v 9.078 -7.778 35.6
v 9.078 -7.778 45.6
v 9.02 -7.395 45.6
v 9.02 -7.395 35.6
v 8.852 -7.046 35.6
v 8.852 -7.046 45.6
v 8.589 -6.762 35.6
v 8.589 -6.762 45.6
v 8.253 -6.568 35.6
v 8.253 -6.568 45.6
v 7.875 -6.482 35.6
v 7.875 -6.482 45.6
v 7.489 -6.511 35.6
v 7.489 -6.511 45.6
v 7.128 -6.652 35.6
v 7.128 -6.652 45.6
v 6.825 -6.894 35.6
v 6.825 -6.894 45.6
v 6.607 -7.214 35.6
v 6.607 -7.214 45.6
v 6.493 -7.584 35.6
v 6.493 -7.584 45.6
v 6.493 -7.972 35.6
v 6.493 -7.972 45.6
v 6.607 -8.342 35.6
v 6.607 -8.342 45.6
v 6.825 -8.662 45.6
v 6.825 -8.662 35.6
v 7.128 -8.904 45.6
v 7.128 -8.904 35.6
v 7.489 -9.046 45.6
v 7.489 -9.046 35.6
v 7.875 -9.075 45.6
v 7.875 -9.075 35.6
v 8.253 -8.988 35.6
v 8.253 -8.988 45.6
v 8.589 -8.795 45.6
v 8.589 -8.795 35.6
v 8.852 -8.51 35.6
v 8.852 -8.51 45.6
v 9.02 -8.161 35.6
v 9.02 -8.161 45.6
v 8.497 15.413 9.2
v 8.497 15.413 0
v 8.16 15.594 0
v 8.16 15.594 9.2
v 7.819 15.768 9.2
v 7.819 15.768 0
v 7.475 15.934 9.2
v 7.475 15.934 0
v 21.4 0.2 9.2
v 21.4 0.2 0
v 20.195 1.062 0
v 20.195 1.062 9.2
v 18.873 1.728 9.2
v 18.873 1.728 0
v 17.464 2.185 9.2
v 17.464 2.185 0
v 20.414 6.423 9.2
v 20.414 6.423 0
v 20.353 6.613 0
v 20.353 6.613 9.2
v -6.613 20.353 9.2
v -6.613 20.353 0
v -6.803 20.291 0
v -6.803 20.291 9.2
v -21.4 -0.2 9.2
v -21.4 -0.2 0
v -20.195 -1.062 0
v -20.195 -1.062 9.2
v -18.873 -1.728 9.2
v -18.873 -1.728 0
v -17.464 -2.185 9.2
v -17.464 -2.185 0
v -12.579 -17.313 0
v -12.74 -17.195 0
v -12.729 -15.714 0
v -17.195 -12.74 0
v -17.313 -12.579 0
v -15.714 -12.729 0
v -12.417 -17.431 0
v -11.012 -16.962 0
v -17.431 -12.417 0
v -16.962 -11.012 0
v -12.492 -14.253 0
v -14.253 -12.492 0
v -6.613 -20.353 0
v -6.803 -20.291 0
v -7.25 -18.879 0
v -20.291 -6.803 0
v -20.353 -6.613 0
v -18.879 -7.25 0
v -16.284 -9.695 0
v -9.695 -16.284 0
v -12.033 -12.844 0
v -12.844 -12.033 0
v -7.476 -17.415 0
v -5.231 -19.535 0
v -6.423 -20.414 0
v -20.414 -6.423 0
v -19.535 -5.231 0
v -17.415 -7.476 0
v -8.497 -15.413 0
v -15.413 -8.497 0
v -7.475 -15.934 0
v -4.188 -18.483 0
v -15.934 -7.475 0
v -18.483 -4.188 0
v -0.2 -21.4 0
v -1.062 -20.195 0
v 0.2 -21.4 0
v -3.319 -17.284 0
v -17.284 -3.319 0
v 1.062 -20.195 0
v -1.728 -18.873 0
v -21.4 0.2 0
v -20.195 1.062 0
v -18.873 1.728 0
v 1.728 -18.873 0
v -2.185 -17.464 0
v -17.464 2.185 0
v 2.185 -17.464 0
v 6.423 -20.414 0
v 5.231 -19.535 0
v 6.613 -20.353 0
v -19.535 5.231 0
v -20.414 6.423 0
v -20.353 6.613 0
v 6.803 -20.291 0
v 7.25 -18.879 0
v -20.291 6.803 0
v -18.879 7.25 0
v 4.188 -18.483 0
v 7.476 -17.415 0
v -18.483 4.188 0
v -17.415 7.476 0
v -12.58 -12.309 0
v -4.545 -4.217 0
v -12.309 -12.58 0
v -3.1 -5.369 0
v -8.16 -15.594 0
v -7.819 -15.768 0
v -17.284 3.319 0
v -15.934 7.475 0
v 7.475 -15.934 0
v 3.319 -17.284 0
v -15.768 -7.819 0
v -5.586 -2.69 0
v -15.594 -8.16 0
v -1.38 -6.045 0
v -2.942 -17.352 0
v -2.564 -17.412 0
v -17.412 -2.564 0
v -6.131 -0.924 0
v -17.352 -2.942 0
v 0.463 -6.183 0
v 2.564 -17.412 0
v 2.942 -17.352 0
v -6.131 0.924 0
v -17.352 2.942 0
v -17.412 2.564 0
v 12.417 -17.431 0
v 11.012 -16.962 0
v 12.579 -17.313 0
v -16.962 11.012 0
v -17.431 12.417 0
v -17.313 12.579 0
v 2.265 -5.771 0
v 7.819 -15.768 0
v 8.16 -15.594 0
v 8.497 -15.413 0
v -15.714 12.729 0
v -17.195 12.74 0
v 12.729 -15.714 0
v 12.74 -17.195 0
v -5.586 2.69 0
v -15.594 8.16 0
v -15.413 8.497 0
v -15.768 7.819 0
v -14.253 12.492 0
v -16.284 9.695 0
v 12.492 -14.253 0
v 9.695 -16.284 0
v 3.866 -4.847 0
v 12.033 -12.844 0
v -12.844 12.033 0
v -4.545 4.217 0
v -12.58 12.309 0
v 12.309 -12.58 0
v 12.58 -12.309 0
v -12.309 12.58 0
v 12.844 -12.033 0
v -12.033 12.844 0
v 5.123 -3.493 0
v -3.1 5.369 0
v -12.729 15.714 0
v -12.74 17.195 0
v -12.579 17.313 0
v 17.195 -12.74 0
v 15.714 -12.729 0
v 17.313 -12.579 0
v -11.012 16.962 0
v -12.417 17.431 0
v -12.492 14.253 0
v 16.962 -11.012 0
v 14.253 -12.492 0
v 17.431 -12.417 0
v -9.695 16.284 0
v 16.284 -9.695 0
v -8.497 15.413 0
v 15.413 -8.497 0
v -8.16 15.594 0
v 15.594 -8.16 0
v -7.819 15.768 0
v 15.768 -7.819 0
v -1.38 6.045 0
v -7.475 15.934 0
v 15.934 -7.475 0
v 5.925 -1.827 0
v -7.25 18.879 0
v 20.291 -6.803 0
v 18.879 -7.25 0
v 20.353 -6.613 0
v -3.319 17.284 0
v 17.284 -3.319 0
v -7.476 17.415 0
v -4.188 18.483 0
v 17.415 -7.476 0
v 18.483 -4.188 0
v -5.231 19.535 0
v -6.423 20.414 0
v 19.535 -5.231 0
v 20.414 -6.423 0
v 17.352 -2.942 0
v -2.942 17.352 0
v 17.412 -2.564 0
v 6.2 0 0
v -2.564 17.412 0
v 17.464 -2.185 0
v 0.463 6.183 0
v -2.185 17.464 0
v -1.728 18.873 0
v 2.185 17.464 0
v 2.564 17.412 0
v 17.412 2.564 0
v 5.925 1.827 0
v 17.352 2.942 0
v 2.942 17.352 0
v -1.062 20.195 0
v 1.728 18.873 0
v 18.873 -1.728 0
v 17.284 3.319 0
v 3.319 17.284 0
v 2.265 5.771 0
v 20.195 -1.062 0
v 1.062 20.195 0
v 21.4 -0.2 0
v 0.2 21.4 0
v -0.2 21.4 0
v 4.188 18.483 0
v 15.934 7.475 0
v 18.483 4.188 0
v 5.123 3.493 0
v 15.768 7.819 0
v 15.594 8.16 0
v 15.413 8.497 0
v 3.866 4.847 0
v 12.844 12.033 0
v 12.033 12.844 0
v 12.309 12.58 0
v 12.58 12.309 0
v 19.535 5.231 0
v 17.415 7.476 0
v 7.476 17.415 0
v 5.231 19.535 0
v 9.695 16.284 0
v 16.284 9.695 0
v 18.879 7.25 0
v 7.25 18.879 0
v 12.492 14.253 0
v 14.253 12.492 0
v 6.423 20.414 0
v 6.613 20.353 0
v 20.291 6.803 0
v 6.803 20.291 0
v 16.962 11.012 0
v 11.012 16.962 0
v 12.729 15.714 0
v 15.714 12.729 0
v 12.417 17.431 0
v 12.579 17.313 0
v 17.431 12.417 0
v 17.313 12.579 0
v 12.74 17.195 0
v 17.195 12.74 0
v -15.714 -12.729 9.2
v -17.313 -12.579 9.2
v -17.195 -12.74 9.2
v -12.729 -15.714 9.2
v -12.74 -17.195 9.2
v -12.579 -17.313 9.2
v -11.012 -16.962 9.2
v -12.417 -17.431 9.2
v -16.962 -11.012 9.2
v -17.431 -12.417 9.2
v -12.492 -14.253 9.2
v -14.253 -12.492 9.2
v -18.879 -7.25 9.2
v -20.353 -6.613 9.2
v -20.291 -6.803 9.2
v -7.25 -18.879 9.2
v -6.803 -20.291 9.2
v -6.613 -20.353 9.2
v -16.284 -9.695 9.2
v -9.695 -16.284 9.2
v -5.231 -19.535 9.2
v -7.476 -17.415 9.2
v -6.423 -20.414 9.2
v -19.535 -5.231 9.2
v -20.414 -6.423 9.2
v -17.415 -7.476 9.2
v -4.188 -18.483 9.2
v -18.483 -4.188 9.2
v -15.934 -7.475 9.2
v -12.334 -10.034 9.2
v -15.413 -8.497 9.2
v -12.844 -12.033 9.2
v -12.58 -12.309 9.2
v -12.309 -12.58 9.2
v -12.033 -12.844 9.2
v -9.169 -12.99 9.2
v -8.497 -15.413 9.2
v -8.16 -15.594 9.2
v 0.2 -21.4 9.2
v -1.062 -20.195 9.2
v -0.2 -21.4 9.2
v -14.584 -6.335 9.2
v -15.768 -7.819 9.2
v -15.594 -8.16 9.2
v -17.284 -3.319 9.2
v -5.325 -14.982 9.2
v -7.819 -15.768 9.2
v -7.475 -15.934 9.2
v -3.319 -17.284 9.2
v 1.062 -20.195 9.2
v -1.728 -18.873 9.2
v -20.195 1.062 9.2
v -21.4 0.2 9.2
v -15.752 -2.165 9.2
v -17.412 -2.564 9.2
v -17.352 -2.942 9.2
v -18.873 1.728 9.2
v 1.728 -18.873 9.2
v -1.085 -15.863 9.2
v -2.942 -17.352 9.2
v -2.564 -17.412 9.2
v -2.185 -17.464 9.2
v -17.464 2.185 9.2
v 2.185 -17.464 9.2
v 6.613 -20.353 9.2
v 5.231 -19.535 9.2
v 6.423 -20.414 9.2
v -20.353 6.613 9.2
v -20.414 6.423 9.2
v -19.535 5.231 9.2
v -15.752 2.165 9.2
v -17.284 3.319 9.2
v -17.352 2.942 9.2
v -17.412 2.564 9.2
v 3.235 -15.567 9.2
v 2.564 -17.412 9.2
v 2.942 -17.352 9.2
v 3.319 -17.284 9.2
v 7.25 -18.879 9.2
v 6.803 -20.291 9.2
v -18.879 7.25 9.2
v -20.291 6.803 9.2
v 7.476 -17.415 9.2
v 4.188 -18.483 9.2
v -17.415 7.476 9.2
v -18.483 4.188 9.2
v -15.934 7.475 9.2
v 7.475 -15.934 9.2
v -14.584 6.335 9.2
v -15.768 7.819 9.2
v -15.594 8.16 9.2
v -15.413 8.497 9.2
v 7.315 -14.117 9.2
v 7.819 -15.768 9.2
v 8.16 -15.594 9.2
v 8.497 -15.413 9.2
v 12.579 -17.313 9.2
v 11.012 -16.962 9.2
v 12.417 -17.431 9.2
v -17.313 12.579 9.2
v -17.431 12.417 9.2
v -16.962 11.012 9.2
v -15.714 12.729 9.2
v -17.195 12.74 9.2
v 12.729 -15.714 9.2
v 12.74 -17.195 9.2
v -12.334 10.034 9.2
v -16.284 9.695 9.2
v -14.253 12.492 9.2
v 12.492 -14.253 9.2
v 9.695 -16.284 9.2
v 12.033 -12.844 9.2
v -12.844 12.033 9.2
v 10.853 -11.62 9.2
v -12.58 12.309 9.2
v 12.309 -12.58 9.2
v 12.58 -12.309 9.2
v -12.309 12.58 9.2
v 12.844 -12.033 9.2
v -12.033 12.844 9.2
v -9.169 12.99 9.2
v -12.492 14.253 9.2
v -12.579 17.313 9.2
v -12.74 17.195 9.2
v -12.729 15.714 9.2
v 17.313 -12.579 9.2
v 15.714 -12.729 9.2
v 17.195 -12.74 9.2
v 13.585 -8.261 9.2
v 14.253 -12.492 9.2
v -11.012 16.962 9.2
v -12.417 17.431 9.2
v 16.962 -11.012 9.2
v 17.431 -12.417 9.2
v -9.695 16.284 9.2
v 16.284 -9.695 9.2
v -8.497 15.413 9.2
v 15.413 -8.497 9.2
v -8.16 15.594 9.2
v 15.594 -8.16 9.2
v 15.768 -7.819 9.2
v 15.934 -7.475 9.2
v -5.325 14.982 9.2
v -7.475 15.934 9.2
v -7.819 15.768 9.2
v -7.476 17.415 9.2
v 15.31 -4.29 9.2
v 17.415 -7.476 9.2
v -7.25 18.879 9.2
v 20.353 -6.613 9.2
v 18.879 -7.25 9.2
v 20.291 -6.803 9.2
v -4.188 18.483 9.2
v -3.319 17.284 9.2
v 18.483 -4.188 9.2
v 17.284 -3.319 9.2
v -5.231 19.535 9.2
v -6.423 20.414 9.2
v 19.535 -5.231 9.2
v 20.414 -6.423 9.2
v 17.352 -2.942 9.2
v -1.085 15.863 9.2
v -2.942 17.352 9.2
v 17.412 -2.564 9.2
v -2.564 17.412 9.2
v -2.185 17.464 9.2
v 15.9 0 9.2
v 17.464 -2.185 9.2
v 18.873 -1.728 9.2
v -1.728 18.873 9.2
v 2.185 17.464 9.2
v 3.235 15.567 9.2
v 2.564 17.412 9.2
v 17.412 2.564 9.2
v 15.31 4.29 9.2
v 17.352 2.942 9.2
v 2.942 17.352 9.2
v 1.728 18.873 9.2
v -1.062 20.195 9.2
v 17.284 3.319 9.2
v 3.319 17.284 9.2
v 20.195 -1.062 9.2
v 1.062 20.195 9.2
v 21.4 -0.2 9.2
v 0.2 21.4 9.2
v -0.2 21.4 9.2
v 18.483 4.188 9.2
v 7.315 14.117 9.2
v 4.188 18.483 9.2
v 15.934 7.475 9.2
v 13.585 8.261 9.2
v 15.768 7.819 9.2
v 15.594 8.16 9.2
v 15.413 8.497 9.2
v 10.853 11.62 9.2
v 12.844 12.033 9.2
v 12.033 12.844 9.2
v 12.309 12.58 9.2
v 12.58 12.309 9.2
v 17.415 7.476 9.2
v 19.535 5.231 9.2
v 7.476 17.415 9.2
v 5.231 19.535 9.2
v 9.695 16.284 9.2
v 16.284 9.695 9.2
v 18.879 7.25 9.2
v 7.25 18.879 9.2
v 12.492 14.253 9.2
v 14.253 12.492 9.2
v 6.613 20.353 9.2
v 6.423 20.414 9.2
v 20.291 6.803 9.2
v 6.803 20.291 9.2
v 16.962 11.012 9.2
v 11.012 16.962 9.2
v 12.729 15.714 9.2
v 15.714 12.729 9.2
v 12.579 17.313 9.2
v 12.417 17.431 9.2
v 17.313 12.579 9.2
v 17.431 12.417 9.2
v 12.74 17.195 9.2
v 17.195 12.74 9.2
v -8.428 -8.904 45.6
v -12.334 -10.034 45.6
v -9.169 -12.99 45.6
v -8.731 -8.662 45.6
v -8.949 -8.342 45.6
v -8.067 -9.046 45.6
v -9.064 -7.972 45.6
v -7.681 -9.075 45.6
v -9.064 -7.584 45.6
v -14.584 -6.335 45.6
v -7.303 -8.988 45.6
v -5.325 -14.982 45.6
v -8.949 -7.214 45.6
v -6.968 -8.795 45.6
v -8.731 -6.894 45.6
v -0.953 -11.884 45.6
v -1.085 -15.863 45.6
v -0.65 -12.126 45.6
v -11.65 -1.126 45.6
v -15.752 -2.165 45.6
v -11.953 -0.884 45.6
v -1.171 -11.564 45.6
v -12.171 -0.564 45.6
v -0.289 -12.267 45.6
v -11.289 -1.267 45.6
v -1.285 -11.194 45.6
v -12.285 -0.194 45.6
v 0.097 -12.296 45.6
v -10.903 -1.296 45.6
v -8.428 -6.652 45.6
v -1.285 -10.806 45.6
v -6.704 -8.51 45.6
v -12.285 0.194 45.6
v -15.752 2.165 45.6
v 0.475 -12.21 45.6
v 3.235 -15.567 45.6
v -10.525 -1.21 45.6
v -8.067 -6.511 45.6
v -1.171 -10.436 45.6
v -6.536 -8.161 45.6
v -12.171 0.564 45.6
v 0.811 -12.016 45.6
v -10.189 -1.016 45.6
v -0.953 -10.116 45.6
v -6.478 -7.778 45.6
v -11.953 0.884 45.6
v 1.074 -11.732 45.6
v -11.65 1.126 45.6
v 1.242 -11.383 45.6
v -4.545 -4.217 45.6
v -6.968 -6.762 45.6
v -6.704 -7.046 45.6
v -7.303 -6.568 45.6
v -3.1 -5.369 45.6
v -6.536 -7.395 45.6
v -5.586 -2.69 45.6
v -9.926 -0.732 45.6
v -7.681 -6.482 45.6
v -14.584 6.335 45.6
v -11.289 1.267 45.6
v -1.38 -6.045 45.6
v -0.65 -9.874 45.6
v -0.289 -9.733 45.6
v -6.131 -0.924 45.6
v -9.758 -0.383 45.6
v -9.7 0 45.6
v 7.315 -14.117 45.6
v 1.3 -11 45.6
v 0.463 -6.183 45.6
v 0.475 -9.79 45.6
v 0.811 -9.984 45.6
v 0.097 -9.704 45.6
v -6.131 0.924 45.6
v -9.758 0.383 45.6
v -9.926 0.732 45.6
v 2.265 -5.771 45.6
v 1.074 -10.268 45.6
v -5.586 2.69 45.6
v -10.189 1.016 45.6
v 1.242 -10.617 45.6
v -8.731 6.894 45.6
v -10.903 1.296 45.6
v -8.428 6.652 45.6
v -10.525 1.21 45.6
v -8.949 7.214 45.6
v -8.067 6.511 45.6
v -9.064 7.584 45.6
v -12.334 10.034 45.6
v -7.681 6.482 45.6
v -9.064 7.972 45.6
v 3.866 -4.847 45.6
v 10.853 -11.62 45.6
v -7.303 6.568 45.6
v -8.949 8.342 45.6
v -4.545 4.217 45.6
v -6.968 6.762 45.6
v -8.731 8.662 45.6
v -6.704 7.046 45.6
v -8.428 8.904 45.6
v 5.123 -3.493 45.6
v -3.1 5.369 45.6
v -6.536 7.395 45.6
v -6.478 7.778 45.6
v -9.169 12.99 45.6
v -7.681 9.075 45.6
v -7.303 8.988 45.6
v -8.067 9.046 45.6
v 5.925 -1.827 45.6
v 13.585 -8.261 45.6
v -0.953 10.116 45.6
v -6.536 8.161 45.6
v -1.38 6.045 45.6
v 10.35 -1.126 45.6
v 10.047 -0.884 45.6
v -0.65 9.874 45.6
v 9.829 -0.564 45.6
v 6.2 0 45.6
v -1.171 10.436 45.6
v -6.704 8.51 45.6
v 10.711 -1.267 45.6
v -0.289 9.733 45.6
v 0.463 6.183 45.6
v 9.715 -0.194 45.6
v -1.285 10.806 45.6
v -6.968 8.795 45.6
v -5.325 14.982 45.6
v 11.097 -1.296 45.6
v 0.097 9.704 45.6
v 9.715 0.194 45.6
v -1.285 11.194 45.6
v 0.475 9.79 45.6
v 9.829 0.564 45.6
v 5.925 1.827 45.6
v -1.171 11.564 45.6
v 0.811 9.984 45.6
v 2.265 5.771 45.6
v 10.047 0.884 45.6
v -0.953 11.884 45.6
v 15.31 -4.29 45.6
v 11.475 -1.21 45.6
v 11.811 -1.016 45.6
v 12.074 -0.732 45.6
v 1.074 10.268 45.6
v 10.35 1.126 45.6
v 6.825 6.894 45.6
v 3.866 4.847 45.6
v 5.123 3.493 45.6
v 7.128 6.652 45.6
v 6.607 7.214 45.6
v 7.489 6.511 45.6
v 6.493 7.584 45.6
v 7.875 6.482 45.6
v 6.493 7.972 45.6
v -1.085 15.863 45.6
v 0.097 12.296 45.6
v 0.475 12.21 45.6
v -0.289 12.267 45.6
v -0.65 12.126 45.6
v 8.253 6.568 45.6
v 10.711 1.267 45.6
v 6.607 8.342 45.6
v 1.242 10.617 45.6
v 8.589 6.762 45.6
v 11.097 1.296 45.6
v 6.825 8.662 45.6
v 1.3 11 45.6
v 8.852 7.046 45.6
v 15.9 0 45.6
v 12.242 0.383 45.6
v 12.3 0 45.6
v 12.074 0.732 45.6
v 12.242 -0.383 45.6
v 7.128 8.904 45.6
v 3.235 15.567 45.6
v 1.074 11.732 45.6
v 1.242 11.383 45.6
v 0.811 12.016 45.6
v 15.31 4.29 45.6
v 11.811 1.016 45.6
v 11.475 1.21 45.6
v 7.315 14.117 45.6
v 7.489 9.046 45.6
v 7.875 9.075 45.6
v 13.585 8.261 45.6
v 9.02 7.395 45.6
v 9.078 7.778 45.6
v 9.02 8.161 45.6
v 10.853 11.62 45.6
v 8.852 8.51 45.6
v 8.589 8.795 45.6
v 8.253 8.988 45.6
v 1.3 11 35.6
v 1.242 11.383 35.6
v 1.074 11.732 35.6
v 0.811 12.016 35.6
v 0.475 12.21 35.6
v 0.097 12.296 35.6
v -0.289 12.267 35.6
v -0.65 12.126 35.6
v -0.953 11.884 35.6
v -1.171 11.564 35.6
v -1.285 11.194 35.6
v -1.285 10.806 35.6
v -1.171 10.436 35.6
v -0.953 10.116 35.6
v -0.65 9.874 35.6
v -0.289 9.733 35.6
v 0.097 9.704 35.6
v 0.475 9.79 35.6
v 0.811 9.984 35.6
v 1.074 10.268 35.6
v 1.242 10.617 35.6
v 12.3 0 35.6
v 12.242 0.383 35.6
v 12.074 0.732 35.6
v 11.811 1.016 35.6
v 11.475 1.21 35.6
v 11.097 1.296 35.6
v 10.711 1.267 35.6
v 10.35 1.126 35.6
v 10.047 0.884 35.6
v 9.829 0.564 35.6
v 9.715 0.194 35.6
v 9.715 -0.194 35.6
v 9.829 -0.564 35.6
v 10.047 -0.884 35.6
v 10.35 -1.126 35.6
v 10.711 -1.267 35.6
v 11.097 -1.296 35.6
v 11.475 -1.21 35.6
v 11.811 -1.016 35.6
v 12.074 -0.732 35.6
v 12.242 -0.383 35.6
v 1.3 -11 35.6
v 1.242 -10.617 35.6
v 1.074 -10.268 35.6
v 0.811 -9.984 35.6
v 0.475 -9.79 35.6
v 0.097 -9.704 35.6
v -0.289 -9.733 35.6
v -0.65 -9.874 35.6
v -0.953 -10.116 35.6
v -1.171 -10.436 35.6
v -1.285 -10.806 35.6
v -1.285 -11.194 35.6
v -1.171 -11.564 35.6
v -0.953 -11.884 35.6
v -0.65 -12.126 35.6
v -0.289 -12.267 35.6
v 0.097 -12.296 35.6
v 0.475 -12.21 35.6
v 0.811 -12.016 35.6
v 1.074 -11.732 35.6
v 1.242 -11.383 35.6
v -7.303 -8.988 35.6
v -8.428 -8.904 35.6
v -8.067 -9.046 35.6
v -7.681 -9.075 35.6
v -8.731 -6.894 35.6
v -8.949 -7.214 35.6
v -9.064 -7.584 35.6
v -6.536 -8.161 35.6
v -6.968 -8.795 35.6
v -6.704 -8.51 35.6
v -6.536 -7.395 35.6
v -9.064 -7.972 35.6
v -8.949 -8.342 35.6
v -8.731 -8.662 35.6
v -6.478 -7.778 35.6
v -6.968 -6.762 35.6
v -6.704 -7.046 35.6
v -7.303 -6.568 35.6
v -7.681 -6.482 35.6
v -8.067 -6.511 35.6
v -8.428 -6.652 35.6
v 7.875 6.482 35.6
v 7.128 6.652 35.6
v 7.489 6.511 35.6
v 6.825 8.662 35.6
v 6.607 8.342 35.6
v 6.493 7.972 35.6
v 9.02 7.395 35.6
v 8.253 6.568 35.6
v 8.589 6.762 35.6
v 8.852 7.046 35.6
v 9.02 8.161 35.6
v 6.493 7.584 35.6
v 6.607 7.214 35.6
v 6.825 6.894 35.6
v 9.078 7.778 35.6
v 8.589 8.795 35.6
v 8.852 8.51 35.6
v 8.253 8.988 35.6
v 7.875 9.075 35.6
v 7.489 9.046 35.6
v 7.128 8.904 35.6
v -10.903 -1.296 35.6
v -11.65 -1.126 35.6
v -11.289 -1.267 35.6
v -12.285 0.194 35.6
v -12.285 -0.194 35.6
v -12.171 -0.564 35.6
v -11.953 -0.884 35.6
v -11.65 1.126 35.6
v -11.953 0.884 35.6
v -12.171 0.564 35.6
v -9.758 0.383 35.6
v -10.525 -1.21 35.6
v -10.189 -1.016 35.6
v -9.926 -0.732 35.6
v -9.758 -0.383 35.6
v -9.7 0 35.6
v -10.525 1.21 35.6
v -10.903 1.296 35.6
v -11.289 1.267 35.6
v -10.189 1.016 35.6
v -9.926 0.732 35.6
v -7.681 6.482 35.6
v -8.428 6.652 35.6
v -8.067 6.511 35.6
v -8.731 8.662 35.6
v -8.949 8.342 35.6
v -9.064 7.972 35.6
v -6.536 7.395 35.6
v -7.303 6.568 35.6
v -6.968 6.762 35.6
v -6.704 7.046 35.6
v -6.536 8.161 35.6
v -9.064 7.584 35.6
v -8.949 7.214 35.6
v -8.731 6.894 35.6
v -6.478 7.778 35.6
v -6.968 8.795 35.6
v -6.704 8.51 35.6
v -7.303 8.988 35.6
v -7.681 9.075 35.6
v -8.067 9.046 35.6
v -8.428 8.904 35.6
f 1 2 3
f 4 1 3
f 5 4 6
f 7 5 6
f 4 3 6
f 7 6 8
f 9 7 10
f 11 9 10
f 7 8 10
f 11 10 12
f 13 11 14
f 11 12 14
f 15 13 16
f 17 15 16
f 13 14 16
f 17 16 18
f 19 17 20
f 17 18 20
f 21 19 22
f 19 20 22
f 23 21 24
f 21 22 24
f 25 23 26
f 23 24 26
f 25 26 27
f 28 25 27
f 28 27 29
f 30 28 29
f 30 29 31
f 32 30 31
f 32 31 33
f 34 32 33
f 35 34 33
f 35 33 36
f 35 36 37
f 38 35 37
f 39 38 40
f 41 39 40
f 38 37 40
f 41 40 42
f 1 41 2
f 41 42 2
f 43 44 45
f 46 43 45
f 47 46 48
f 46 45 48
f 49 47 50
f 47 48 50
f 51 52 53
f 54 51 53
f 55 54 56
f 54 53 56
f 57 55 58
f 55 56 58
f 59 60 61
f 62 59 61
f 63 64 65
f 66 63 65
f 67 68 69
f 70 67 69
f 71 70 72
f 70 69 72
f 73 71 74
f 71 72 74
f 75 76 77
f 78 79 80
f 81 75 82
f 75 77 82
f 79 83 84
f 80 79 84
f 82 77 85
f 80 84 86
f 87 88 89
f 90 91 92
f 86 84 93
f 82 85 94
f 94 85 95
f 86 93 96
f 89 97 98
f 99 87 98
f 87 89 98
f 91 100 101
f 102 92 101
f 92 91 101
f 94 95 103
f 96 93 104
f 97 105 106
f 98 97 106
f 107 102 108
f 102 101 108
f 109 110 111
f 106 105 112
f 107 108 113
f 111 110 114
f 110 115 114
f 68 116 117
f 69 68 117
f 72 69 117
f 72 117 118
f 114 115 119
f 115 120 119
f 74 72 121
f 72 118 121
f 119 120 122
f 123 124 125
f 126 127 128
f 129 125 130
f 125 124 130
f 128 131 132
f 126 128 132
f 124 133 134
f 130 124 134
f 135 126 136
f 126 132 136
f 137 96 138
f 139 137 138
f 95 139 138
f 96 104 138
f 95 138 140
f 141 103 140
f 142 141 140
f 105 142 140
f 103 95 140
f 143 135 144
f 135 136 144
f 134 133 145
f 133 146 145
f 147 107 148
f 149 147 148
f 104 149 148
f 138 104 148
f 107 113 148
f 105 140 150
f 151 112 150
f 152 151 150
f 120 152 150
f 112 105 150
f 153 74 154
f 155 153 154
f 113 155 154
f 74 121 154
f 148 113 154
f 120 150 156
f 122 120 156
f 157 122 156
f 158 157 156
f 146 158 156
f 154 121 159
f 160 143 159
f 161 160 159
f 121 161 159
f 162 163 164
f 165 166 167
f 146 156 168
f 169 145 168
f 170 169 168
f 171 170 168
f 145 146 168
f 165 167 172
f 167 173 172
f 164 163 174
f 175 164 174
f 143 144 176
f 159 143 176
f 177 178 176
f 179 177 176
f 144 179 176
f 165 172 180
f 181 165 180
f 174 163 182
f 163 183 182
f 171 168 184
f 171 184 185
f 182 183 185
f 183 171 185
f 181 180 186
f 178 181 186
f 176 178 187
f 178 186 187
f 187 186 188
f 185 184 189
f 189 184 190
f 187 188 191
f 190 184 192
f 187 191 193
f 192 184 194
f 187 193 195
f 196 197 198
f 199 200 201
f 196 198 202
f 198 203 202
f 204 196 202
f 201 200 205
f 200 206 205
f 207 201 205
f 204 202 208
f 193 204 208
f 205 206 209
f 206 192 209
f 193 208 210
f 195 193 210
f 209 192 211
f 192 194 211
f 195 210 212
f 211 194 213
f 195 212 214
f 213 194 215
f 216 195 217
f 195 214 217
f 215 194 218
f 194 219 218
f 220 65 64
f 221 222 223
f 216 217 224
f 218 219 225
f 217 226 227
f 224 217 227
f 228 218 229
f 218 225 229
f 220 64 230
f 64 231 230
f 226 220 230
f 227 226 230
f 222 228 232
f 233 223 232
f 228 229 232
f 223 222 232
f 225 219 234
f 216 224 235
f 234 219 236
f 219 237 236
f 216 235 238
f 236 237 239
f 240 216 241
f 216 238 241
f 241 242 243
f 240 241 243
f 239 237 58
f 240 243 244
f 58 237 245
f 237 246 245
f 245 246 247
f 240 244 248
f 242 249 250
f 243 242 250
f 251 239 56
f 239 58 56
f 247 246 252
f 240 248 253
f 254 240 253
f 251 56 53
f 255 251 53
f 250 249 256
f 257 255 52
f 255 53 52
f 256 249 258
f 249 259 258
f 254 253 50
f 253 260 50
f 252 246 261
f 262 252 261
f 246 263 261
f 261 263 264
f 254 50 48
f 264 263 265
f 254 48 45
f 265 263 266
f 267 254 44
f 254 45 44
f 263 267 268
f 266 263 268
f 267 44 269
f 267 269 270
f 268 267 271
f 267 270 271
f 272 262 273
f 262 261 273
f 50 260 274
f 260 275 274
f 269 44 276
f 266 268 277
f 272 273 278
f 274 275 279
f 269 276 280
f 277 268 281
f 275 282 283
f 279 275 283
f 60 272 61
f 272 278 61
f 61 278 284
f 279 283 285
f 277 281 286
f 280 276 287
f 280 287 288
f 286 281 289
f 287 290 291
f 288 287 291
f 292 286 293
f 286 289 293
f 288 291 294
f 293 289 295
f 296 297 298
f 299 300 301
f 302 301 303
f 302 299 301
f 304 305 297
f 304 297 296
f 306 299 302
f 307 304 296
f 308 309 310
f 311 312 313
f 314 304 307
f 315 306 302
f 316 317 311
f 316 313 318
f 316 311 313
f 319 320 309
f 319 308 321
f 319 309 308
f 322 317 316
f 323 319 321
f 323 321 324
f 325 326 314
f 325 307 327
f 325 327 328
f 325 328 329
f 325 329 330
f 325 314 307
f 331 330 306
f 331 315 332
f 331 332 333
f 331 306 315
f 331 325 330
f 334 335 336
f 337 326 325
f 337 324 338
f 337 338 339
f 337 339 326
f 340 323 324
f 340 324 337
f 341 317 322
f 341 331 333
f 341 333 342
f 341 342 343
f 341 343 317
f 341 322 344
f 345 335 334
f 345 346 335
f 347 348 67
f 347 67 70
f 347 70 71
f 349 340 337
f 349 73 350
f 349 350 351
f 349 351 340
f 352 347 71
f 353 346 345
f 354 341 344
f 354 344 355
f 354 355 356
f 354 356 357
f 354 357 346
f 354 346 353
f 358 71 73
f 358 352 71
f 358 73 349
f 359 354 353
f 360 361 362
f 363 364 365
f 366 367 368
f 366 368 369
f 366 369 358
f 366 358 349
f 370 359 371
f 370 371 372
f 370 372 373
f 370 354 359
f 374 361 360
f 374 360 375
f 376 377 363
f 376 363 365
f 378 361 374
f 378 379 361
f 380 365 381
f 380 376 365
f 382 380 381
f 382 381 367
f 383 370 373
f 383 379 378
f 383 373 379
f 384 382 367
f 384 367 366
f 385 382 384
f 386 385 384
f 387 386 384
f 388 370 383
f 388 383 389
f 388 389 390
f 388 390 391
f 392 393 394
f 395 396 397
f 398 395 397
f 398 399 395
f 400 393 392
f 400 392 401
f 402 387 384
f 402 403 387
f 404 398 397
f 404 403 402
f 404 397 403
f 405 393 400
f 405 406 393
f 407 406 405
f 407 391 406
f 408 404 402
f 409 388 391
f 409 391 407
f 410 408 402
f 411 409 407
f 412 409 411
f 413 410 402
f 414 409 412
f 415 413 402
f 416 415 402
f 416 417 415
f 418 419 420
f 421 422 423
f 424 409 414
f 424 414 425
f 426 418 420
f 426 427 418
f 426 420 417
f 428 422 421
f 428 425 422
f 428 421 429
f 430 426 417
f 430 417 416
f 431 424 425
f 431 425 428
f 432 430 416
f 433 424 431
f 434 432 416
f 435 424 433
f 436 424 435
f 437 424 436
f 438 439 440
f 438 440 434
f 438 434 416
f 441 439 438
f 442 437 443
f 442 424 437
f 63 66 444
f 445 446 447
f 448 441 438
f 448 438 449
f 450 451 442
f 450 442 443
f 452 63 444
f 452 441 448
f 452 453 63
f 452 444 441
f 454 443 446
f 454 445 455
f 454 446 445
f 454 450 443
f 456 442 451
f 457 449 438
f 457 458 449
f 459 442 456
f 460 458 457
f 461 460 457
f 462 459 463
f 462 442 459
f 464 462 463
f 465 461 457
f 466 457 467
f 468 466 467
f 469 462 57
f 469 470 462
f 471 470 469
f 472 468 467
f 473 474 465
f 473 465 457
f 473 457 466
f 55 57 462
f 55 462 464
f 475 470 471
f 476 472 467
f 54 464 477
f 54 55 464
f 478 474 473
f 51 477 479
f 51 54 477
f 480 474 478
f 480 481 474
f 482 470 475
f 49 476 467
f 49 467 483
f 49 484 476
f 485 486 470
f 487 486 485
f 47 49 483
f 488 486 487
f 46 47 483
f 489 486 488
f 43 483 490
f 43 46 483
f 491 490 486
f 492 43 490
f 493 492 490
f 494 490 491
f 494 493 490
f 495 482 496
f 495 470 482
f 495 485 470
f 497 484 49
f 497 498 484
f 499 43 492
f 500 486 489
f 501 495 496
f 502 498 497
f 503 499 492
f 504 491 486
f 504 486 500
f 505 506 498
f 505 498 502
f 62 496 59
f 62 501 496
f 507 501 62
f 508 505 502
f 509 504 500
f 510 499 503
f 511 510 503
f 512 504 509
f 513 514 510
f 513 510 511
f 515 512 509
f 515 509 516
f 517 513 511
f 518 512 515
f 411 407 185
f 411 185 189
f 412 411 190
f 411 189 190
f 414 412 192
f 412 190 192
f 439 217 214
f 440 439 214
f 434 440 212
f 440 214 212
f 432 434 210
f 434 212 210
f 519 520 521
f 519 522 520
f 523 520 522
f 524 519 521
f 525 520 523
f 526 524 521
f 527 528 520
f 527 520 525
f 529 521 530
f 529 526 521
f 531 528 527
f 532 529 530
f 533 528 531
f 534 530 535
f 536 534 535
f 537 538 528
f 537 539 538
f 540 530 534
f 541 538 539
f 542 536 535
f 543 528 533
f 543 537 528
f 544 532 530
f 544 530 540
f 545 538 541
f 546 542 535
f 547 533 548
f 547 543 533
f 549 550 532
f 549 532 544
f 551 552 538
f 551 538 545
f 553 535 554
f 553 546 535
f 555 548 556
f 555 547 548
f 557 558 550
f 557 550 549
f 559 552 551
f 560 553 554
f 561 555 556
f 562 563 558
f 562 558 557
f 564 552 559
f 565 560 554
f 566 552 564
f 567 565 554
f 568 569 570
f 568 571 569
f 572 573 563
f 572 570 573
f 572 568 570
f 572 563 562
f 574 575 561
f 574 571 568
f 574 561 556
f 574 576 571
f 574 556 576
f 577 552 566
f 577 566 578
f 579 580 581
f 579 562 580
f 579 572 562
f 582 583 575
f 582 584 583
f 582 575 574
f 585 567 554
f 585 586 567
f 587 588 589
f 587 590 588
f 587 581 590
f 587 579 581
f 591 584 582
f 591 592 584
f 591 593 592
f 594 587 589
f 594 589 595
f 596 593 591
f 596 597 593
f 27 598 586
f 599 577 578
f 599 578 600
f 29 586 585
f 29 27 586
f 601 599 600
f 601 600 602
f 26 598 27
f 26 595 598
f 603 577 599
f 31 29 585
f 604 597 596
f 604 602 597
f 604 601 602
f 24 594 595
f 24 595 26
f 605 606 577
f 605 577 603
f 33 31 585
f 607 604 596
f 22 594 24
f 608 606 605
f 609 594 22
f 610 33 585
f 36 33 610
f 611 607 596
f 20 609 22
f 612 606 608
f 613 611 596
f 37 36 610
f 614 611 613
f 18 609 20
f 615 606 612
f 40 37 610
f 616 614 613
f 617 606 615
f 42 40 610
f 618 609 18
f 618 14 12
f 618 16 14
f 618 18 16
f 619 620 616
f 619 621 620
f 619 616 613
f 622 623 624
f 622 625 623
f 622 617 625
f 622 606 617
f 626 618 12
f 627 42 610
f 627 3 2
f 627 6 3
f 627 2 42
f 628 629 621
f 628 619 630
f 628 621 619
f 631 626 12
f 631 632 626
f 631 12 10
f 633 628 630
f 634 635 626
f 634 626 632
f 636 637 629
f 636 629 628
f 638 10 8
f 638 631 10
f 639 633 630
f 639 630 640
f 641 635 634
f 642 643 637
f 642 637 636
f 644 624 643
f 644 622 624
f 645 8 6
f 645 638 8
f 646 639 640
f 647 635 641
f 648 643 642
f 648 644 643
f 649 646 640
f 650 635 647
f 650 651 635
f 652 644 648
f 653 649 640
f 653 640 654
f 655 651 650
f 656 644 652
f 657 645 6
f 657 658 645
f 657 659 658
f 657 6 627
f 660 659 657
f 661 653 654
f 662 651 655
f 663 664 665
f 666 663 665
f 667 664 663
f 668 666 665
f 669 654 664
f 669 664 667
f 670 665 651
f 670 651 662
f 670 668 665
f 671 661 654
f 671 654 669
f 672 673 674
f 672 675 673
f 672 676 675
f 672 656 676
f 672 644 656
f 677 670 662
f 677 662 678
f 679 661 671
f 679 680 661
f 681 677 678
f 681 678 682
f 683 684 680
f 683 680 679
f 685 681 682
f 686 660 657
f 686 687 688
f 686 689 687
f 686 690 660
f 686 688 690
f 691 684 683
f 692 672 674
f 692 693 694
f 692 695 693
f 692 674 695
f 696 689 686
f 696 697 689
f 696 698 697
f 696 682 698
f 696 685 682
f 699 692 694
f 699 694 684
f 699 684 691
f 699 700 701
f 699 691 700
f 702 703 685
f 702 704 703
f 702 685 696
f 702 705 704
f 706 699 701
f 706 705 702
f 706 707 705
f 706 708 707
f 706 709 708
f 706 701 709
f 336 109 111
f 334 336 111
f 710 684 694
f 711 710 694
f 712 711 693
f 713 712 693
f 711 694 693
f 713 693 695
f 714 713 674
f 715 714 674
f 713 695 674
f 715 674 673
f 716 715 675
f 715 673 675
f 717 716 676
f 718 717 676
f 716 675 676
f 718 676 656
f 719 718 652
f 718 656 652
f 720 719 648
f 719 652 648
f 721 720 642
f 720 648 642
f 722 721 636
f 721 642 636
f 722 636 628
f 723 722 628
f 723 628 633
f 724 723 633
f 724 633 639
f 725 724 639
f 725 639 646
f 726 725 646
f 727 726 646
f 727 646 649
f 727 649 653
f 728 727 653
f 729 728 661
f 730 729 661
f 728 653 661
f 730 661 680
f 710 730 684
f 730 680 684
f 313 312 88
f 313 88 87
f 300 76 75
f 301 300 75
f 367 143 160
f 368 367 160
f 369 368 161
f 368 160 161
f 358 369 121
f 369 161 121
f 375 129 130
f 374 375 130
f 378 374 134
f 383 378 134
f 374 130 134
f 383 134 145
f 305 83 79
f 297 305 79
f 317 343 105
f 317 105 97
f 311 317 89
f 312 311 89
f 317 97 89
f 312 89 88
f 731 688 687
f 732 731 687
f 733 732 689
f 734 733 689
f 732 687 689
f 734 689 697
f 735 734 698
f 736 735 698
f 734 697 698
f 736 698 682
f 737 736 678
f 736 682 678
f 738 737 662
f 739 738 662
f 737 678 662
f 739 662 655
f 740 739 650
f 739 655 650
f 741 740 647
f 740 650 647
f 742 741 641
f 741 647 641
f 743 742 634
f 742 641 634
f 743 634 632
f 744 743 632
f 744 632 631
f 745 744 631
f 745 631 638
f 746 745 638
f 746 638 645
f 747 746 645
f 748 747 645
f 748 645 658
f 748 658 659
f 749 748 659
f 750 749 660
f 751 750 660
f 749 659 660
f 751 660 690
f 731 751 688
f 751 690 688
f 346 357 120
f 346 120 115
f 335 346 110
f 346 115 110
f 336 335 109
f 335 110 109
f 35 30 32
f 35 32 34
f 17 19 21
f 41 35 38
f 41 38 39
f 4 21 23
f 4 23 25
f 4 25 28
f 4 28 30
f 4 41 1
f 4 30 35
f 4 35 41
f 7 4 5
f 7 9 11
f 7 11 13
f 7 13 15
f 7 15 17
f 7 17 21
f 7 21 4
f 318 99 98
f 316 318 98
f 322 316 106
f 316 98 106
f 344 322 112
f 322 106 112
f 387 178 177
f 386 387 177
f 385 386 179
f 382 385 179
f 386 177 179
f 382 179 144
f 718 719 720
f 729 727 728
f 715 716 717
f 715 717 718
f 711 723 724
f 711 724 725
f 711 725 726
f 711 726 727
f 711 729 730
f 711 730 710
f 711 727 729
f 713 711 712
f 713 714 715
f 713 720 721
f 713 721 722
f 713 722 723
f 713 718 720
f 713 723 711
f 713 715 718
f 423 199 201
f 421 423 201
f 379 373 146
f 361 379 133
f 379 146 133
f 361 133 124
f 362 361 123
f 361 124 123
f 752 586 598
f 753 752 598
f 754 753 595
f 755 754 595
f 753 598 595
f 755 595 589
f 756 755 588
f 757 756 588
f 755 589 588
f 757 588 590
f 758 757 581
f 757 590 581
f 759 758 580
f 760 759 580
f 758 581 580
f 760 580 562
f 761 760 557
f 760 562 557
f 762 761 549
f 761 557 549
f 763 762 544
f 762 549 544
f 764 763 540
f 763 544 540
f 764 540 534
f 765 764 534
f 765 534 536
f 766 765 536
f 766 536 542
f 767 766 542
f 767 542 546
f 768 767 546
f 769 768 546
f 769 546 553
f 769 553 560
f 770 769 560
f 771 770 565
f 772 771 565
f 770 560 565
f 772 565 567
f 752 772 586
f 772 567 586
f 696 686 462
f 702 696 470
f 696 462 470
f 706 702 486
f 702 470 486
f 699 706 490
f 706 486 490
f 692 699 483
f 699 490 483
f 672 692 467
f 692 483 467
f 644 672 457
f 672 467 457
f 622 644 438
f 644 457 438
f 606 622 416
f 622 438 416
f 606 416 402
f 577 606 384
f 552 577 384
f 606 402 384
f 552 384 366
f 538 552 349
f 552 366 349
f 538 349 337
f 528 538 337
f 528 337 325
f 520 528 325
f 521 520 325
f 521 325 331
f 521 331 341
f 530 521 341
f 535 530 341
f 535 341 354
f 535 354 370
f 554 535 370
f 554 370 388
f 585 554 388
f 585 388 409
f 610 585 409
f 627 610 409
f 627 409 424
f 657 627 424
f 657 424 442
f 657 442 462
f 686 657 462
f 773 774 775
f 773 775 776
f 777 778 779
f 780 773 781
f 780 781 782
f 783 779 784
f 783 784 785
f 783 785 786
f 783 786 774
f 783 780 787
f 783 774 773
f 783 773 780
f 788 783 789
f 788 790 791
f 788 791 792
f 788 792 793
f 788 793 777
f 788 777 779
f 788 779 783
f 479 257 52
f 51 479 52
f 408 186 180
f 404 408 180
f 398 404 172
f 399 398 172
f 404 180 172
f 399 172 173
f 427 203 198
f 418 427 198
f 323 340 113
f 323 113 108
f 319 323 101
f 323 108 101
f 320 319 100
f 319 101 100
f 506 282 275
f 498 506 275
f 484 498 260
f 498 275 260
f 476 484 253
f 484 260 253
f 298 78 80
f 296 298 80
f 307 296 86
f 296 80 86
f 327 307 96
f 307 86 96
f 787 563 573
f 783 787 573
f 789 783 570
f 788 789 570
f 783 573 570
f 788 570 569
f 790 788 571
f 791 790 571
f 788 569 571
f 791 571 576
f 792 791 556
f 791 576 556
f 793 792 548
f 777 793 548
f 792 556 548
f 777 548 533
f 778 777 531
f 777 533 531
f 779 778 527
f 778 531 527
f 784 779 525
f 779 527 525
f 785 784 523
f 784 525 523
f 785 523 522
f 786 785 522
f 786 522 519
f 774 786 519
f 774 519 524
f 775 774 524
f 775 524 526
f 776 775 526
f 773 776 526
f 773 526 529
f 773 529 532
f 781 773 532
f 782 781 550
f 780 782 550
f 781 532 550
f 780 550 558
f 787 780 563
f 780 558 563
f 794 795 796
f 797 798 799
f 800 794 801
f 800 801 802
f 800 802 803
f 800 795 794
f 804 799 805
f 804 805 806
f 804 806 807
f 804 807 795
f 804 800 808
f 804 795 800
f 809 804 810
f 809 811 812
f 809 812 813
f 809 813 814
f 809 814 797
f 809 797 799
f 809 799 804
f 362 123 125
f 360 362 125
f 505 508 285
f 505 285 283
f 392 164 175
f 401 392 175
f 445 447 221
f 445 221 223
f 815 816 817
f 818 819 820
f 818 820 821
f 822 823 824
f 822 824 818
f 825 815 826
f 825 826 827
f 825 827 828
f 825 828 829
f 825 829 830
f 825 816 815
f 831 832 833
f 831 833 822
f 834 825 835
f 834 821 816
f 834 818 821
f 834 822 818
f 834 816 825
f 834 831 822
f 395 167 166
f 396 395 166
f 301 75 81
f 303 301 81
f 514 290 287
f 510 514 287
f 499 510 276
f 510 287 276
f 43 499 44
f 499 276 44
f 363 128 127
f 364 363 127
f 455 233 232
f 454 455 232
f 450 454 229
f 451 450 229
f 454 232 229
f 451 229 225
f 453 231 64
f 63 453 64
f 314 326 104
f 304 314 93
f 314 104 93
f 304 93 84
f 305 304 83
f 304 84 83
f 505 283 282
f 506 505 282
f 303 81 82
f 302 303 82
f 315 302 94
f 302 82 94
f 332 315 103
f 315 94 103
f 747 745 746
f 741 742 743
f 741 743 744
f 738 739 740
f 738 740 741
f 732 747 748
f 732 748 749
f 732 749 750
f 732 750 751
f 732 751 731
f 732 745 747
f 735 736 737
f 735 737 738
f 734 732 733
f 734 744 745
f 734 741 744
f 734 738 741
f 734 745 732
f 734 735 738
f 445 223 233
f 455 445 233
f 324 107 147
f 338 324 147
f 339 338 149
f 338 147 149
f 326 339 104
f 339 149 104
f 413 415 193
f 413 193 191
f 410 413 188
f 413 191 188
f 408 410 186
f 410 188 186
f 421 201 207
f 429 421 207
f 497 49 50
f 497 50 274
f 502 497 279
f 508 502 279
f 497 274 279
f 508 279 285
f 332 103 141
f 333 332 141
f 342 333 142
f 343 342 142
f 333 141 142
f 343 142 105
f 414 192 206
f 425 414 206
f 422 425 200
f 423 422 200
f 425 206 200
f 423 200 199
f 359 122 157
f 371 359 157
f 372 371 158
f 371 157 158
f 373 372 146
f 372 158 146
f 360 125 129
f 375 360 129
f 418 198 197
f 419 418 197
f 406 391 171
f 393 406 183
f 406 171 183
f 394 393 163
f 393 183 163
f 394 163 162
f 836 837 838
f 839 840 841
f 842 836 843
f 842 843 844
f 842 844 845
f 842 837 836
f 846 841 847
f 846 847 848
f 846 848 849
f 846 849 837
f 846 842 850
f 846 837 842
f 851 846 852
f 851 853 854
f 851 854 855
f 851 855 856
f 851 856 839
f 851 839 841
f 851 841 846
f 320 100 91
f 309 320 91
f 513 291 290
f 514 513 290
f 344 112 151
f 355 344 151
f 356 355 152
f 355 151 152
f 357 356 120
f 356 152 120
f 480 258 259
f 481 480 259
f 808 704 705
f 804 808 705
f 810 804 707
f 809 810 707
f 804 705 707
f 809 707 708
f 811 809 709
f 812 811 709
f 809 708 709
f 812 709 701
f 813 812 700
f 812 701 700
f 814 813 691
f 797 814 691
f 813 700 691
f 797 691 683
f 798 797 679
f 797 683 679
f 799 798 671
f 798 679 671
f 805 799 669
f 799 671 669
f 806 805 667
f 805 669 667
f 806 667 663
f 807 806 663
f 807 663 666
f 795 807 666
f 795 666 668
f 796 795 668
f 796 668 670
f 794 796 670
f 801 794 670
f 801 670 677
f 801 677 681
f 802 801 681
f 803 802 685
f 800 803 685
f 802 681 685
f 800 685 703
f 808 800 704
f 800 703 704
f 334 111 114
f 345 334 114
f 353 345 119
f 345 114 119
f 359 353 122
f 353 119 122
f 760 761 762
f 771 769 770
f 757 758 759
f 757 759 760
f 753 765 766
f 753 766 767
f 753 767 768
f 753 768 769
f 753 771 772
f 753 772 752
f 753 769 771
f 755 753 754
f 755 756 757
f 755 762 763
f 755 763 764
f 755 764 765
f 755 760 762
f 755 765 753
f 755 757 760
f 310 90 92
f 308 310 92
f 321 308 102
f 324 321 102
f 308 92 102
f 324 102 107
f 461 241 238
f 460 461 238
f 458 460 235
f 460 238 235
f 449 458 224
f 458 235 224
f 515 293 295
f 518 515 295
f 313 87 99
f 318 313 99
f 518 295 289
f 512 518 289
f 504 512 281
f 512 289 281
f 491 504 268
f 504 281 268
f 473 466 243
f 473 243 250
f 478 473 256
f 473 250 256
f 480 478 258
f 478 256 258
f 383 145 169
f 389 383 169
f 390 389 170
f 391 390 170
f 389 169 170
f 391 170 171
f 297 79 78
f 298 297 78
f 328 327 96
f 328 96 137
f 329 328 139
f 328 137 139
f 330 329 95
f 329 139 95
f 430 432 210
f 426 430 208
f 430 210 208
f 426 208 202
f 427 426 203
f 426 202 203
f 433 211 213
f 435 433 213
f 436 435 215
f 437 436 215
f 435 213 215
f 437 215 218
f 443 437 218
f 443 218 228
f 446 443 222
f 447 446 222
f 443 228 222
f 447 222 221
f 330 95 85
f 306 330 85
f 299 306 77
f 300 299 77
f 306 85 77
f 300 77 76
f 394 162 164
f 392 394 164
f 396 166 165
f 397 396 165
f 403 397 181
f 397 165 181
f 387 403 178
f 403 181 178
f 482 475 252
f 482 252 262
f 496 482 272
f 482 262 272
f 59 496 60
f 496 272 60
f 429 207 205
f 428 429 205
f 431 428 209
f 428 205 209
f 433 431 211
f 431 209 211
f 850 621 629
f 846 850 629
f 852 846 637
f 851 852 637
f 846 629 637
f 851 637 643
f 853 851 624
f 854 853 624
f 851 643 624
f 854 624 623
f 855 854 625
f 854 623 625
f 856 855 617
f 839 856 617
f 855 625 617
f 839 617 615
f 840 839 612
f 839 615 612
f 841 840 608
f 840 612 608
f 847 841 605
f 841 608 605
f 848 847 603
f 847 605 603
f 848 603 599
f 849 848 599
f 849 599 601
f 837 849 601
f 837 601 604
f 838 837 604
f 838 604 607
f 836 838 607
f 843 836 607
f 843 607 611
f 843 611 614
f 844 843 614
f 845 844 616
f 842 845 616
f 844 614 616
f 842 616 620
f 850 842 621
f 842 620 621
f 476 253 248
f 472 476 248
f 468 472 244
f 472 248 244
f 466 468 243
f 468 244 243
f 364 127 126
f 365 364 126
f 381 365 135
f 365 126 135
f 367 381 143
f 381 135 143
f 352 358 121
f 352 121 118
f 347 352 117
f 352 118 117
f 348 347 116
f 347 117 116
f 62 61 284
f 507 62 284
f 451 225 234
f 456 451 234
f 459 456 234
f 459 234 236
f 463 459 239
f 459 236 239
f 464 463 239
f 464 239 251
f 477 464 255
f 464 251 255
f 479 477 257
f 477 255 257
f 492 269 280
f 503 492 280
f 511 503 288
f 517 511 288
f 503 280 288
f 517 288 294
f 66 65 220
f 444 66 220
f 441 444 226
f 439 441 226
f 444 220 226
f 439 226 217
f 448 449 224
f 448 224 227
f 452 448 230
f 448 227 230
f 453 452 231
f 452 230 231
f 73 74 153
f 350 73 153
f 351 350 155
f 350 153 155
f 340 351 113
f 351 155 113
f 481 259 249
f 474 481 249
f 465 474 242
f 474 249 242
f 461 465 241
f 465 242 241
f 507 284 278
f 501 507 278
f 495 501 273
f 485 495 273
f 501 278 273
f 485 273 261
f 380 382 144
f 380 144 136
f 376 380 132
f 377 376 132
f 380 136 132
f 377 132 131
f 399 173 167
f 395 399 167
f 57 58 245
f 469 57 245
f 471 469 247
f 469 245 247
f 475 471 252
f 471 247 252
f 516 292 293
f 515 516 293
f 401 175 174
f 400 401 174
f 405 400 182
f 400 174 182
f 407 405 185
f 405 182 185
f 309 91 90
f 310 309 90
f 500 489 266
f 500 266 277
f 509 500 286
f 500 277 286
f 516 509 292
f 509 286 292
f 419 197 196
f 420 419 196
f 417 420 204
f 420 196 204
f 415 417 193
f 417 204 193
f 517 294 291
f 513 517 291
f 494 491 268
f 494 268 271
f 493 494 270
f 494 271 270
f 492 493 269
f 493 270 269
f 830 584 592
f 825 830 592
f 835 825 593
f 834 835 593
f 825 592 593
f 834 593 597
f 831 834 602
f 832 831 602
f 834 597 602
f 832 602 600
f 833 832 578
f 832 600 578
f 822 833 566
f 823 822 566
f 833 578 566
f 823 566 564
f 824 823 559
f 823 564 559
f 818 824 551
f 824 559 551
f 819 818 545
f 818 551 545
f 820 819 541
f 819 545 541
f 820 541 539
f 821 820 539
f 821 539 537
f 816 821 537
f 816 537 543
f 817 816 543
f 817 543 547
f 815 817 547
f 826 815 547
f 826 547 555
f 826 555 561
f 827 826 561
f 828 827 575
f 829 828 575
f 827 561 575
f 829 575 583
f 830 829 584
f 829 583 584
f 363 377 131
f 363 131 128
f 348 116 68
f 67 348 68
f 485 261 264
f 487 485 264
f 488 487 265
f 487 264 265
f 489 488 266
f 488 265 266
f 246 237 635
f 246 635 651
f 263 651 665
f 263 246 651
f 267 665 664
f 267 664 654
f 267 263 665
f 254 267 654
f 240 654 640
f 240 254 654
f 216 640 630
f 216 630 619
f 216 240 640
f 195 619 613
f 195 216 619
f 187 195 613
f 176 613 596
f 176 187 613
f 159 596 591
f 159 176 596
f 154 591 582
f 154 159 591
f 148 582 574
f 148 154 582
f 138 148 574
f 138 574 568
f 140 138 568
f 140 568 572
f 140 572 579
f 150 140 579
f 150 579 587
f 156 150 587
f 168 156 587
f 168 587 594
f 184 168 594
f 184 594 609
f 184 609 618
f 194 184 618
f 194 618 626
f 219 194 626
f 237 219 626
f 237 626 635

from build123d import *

# Parameters (mm, degrees)
F0_R     = 15.9
F0_R_2   = 6.2
F1_DEPTH = 45.6
F2_R     = 1.3
F3_DEPTH = 10
F4_R     = 17.6
F4_R_2   = 6.2
F5_DEPTH = 9.2
F7_DEPTH = 9.2


with BuildPart() as f1:
    # F0 (on Top) → F1 (new body)
    with BuildSketch(Plane.XY):
        Circle(F0_R)
        Circle(F0_R_2, mode=Mode.SUBTRACT)
    extrude(amount=F1_DEPTH)

    # F2 (on face) → F3 (cut)
    with BuildSketch(Plane.XY.offset(45.6)):
        with Locations((11, 0)):
            Circle(F2_R)
        with Locations((7.778175, 7.778175)):
            Circle(F2_R)
        with Locations((0, 11)):
            Circle(F2_R)
        with Locations((-7.778175, 7.778175)):
            Circle(F2_R)
        with Locations((-11, 0)):
            Circle(F2_R)
        with Locations((-7.778175, -7.778175)):
            Circle(F2_R)
        with Locations((0, -11)):
            Circle(F2_R)
        with Locations((7.778175, -7.778175)):
            Circle(F2_R)
    extrude(amount=-F3_DEPTH, mode=Mode.SUBTRACT)

    # F4 (on Top) → F5 (join)
    with BuildSketch(Plane.XY):
        Circle(F4_R)
        Circle(F4_R_2, mode=Mode.SUBTRACT)
    extrude(amount=F5_DEPTH)

    # F6 (on Top) → F7 (join)
    with BuildSketch(Plane.XY):
        with BuildLine():
            Line((21.4, -0.2), (21.4, 0))
            Line((21.4, 0), (17.4, 0))
            Line((17.4, 0), (17.4, -2.2))
            ThreePointArc((17.4, -2.2), (19.517602, -1.435204), (21.4, -0.2))
        make_face()
        with BuildLine():
            Line((17.4, 0), (21.4, 0))
            Line((21.4, 0), (21.4, 0.2))
            ThreePointArc((21.4, 0.2), (19.517602, 1.435204), (17.4, 2.2))
            Line((17.4, 2.2), (17.4, 0))
        make_face()
        with BuildLine():
            Line((20.352609, 6.612964), (16.548383, 5.376896))
            Line((16.548383, 5.376896), (17.228221, 3.284571))
            ThreePointArc((17.228221, 3.284571), (19.005845, 4.66631), (20.414413, 6.422752))
            Line((20.414413, 6.422752), (20.352609, 6.612964))
        make_face()
        with BuildLine():
            Line((15.868546, 7.46922), (16.548383, 5.376896))
            Line((16.548383, 5.376896), (20.352609, 6.612964))
            Line((20.352609, 6.612964), (20.290806, 6.803175))
            ThreePointArc((20.290806, 6.803175), (18.11884, 7.396231), (15.868546, 7.46922))
        make_face()
        with BuildLine():
            Line((17.312964, 12.578604), (14.076896, 10.227463))
            Line((14.076896, 10.227463), (15.370023, 8.447626))
            ThreePointArc((15.370023, 8.447626), (16.633664, 10.311054), (17.430521, 12.416801))
            Line((17.430521, 12.416801), (17.312964, 12.578604))
        make_face()
        with BuildLine():
            Line((12.783768, 12.007301), (14.076896, 10.227463))
            Line((14.076896, 10.227463), (17.312964, 12.578604))
            Line((17.312964, 12.578604), (17.195407, 12.740408))
            ThreePointArc((17.195407, 12.740408), (14.94648, 12.633264), (12.783768, 12.007301))
        make_face()
        with BuildLine():
            Line((12.578604, 17.312964), (10.227463, 14.076896))
            Line((10.227463, 14.076896), (12.007301, 12.783768))
            ThreePointArc((12.007301, 12.783768), (12.633264, 14.94648), (12.740408, 17.195407))
            Line((12.740408, 17.195407), (12.578604, 17.312964))
        make_face()
        with BuildLine():
            Line((8.447626, 15.370023), (10.227463, 14.076896))
            Line((10.227463, 14.076896), (12.578604, 17.312964))
            Line((12.578604, 17.312964), (12.416801, 17.430521))
            ThreePointArc((12.416801, 17.430521), (10.311054, 16.633664), (8.447626, 15.370023))
        make_face()
        with BuildLine():
            Line((6.612964, 20.352609), (5.376896, 16.548383))
            Line((5.376896, 16.548383), (7.46922, 15.868546))
            ThreePointArc((7.46922, 15.868546), (7.396231, 18.11884), (6.803175, 20.290806))
            Line((6.803175, 20.290806), (6.612964, 20.352609))
        make_face()
        with BuildLine():
            Line((3.284571, 17.228221), (5.376896, 16.548383))
            Line((5.376896, 16.548383), (6.612964, 20.352609))
            Line((6.612964, 20.352609), (6.422752, 20.414413))
            ThreePointArc((6.422752, 20.414413), (4.66631, 19.005845), (3.284571, 17.228221))
        make_face()
        with BuildLine():
            Line((0, 21.4), (0, 17.4))
            Line((0, 17.4), (2.2, 17.4))
            ThreePointArc((2.2, 17.4), (1.435204, 19.517602), (0.2, 21.4))
            Line((0.2, 21.4), (0, 21.4))
        make_face()
        with BuildLine():
            Line((-2.2, 17.4), (0, 17.4))
            Line((0, 17.4), (0, 21.4))
            Line((0, 21.4), (-0.2, 21.4))
            ThreePointArc((-0.2, 21.4), (-1.435204, 19.517602), (-2.2, 17.4))
        make_face()
        with BuildLine():
            Line((-6.612964, 20.352609), (-5.376896, 16.548383))
            Line((-5.376896, 16.548383), (-3.284571, 17.228221))
            ThreePointArc((-3.284571, 17.228221), (-4.66631, 19.005845), (-6.422752, 20.414413))
            Line((-6.422752, 20.414413), (-6.612964, 20.352609))
        make_face()
        with BuildLine():
            Line((-7.46922, 15.868546), (-5.376896, 16.548383))
            Line((-5.376896, 16.548383), (-6.612964, 20.352609))
            Line((-6.612964, 20.352609), (-6.803175, 20.290806))
            ThreePointArc((-6.803175, 20.290806), (-7.396231, 18.11884), (-7.46922, 15.868546))
        make_face()
        with BuildLine():
            Line((-12.578604, 17.312964), (-10.227463, 14.076896))
            Line((-10.227463, 14.076896), (-8.447626, 15.370023))
            ThreePointArc((-8.447626, 15.370023), (-10.311054, 16.633664), (-12.416801, 17.430521))
            Line((-12.416801, 17.430521), (-12.578604, 17.312964))
        make_face()
        with BuildLine():
            Line((-12.007301, 12.783768), (-10.227463, 14.076896))
            Line((-10.227463, 14.076896), (-12.578604, 17.312964))
            Line((-12.578604, 17.312964), (-12.740408, 17.195407))
            ThreePointArc((-12.740408, 17.195407), (-12.633264, 14.94648), (-12.007301, 12.783768))
        make_face()
        with BuildLine():
            Line((-17.312964, 12.578604), (-14.076896, 10.227463))
            Line((-14.076896, 10.227463), (-12.783768, 12.007301))
            ThreePointArc((-12.783768, 12.007301), (-14.94648, 12.633264), (-17.195407, 12.740408))
            Line((-17.195407, 12.740408), (-17.312964, 12.578604))
        make_face()
        with BuildLine():
            Line((-15.370023, 8.447626), (-14.076896, 10.227463))
            Line((-14.076896, 10.227463), (-17.312964, 12.578604))
            Line((-17.312964, 12.578604), (-17.430521, 12.416801))
            ThreePointArc((-17.430521, 12.416801), (-16.633664, 10.311054), (-15.370023, 8.447626))
        make_face()
        with BuildLine():
            Line((-20.352609, 6.612964), (-16.548383, 5.376896))
            Line((-16.548383, 5.376896), (-15.868546, 7.46922))
            ThreePointArc((-15.868546, 7.46922), (-18.11884, 7.396231), (-20.290806, 6.803175))
            Line((-20.290806, 6.803175), (-20.352609, 6.612964))
        make_face()
        with BuildLine():
            Line((-17.228221, 3.284571), (-16.548383, 5.376896))
            Line((-16.548383, 5.376896), (-20.352609, 6.612964))
            Line((-20.352609, 6.612964), (-20.414413, 6.422752))
            ThreePointArc((-20.414413, 6.422752), (-19.005845, 4.66631), (-17.228221, 3.284571))
        make_face()
        with BuildLine():
            Line((-21.4, 0), (-17.4, 0))
            Line((-17.4, 0), (-17.4, 2.2))
            ThreePointArc((-17.4, 2.2), (-19.517602, 1.435204), (-21.4, 0.2))
            Line((-21.4, 0.2), (-21.4, 0))
        make_face()
        with BuildLine():
            Line((-17.4, -2.2), (-17.4, 0))
            Line((-17.4, 0), (-21.4, 0))
            Line((-21.4, 0), (-21.4, -0.2))
            ThreePointArc((-21.4, -0.2), (-19.517602, -1.435204), (-17.4, -2.2))
        make_face()
        with BuildLine():
            Line((-20.352609, -6.612964), (-16.548383, -5.376896))
            Line((-16.548383, -5.376896), (-17.228221, -3.284571))
            ThreePointArc((-17.228221, -3.284571), (-19.005845, -4.66631), (-20.414413, -6.422752))
            Line((-20.414413, -6.422752), (-20.352609, -6.612964))
        make_face()
        with BuildLine():
            Line((-15.868546, -7.46922), (-16.548383, -5.376896))
            Line((-16.548383, -5.376896), (-20.352609, -6.612964))
            Line((-20.352609, -6.612964), (-20.290806, -6.803175))
            ThreePointArc((-20.290806, -6.803175), (-18.11884, -7.396231), (-15.868546, -7.46922))
        make_face()
        with BuildLine():
            Line((-17.312964, -12.578604), (-14.076896, -10.227463))
            Line((-14.076896, -10.227463), (-15.370023, -8.447626))
            ThreePointArc((-15.370023, -8.447626), (-16.633664, -10.311054), (-17.430521, -12.416801))
            Line((-17.430521, -12.416801), (-17.312964, -12.578604))
        make_face()
        with BuildLine():
            Line((-12.783768, -12.007301), (-14.076896, -10.227463))
            Line((-14.076896, -10.227463), (-17.312964, -12.578604))
            Line((-17.312964, -12.578604), (-17.195407, -12.740408))
            ThreePointArc((-17.195407, -12.740408), (-14.94648, -12.633264), (-12.783768, -12.007301))
        make_face()
        with BuildLine():
            Line((-12.578604, -17.312964), (-10.227463, -14.076896))
            Line((-10.227463, -14.076896), (-12.007301, -12.783768))
            ThreePointArc((-12.007301, -12.783768), (-12.633264, -14.94648), (-12.740408, -17.195407))
            Line((-12.740408, -17.195407), (-12.578604, -17.312964))
        make_face()
        with BuildLine():
            Line((-8.447626, -15.370023), (-10.227463, -14.076896))
            Line((-10.227463, -14.076896), (-12.578604, -17.312964))
            Line((-12.578604, -17.312964), (-12.416801, -17.430521))
            ThreePointArc((-12.416801, -17.430521), (-10.311054, -16.633664), (-8.447626, -15.370023))
        make_face()
        with BuildLine():
            Line((-6.612964, -20.352609), (-5.376896, -16.548383))
            Line((-5.376896, -16.548383), (-7.46922, -15.868546))
            ThreePointArc((-7.46922, -15.868546), (-7.396231, -18.11884), (-6.803175, -20.290806))
            Line((-6.803175, -20.290806), (-6.612964, -20.352609))
        make_face()
        with BuildLine():
            Line((-3.284571, -17.228221), (-5.376896, -16.548383))
            Line((-5.376896, -16.548383), (-6.612964, -20.352609))
            Line((-6.612964, -20.352609), (-6.422752, -20.414413))
            ThreePointArc((-6.422752, -20.414413), (-4.66631, -19.005845), (-3.284571, -17.228221))
        make_face()
        with BuildLine():
            Line((0, -21.4), (0, -17.4))
            Line((0, -17.4), (-2.2, -17.4))
            ThreePointArc((-2.2, -17.4), (-1.435204, -19.517602), (-0.2, -21.4))
            Line((-0.2, -21.4), (0, -21.4))
        make_face()
        with BuildLine():
            Line((2.2, -17.4), (0, -17.4))
            Line((0, -17.4), (0, -21.4))
            Line((0, -21.4), (0.2, -21.4))
            ThreePointArc((0.2, -21.4), (1.435204, -19.517602), (2.2, -17.4))
        make_face()
        with BuildLine():
            Line((6.612964, -20.352609), (5.376896, -16.548383))
            Line((5.376896, -16.548383), (3.284571, -17.228221))
            ThreePointArc((3.284571, -17.228221), (4.66631, -19.005845), (6.422752, -20.414413))
            Line((6.422752, -20.414413), (6.612964, -20.352609))
        make_face()
        with BuildLine():
            Line((7.46922, -15.868546), (5.376896, -16.548383))
            Line((5.376896, -16.548383), (6.612964, -20.352609))
            Line((6.612964, -20.352609), (6.803175, -20.290806))
            ThreePointArc((6.803175, -20.290806), (7.396231, -18.11884), (7.46922, -15.868546))
        make_face()
        with BuildLine():
            Line((12.578604, -17.312964), (10.227463, -14.076896))
            Line((10.227463, -14.076896), (8.447626, -15.370023))
            ThreePointArc((8.447626, -15.370023), (10.311054, -16.633664), (12.416801, -17.430521))
            Line((12.416801, -17.430521), (12.578604, -17.312964))
        make_face()
        with BuildLine():
            Line((12.007301, -12.783768), (10.227463, -14.076896))
            Line((10.227463, -14.076896), (12.578604, -17.312964))
            Line((12.578604, -17.312964), (12.740408, -17.195407))
            ThreePointArc((12.740408, -17.195407), (12.633264, -14.94648), (12.007301, -12.783768))
        make_face()
        with BuildLine():
            Line((17.312964, -12.578604), (14.076896, -10.227463))
            Line((14.076896, -10.227463), (12.783768, -12.007301))
            ThreePointArc((12.783768, -12.007301), (14.94648, -12.633264), (17.195407, -12.740408))
            Line((17.195407, -12.740408), (17.312964, -12.578604))
        make_face()
        with BuildLine():
            Line((15.370023, -8.447626), (14.076896, -10.227463))
            Line((14.076896, -10.227463), (17.312964, -12.578604))
            Line((17.312964, -12.578604), (17.430521, -12.416801))
            ThreePointArc((17.430521, -12.416801), (16.633664, -10.311054), (15.370023, -8.447626))
        make_face()
        with BuildLine():
            Line((20.352609, -6.612964), (16.548383, -5.376896))
            Line((16.548383, -5.376896), (15.868546, -7.46922))
            ThreePointArc((15.868546, -7.46922), (18.11884, -7.396231), (20.290806, -6.803175))
            Line((20.290806, -6.803175), (20.352609, -6.612964))
        make_face()
        with BuildLine():
            Line((17.228221, -3.284571), (16.548383, -5.376896))
            Line((16.548383, -5.376896), (20.352609, -6.612964))
            Line((20.352609, -6.612964), (20.414413, -6.422752))
            ThreePointArc((20.414413, -6.422752), (19.005845, -4.66631), (17.228221, -3.284571))
        make_face()
    extrude(amount=F7_DEPTH)


solid = f1.part
